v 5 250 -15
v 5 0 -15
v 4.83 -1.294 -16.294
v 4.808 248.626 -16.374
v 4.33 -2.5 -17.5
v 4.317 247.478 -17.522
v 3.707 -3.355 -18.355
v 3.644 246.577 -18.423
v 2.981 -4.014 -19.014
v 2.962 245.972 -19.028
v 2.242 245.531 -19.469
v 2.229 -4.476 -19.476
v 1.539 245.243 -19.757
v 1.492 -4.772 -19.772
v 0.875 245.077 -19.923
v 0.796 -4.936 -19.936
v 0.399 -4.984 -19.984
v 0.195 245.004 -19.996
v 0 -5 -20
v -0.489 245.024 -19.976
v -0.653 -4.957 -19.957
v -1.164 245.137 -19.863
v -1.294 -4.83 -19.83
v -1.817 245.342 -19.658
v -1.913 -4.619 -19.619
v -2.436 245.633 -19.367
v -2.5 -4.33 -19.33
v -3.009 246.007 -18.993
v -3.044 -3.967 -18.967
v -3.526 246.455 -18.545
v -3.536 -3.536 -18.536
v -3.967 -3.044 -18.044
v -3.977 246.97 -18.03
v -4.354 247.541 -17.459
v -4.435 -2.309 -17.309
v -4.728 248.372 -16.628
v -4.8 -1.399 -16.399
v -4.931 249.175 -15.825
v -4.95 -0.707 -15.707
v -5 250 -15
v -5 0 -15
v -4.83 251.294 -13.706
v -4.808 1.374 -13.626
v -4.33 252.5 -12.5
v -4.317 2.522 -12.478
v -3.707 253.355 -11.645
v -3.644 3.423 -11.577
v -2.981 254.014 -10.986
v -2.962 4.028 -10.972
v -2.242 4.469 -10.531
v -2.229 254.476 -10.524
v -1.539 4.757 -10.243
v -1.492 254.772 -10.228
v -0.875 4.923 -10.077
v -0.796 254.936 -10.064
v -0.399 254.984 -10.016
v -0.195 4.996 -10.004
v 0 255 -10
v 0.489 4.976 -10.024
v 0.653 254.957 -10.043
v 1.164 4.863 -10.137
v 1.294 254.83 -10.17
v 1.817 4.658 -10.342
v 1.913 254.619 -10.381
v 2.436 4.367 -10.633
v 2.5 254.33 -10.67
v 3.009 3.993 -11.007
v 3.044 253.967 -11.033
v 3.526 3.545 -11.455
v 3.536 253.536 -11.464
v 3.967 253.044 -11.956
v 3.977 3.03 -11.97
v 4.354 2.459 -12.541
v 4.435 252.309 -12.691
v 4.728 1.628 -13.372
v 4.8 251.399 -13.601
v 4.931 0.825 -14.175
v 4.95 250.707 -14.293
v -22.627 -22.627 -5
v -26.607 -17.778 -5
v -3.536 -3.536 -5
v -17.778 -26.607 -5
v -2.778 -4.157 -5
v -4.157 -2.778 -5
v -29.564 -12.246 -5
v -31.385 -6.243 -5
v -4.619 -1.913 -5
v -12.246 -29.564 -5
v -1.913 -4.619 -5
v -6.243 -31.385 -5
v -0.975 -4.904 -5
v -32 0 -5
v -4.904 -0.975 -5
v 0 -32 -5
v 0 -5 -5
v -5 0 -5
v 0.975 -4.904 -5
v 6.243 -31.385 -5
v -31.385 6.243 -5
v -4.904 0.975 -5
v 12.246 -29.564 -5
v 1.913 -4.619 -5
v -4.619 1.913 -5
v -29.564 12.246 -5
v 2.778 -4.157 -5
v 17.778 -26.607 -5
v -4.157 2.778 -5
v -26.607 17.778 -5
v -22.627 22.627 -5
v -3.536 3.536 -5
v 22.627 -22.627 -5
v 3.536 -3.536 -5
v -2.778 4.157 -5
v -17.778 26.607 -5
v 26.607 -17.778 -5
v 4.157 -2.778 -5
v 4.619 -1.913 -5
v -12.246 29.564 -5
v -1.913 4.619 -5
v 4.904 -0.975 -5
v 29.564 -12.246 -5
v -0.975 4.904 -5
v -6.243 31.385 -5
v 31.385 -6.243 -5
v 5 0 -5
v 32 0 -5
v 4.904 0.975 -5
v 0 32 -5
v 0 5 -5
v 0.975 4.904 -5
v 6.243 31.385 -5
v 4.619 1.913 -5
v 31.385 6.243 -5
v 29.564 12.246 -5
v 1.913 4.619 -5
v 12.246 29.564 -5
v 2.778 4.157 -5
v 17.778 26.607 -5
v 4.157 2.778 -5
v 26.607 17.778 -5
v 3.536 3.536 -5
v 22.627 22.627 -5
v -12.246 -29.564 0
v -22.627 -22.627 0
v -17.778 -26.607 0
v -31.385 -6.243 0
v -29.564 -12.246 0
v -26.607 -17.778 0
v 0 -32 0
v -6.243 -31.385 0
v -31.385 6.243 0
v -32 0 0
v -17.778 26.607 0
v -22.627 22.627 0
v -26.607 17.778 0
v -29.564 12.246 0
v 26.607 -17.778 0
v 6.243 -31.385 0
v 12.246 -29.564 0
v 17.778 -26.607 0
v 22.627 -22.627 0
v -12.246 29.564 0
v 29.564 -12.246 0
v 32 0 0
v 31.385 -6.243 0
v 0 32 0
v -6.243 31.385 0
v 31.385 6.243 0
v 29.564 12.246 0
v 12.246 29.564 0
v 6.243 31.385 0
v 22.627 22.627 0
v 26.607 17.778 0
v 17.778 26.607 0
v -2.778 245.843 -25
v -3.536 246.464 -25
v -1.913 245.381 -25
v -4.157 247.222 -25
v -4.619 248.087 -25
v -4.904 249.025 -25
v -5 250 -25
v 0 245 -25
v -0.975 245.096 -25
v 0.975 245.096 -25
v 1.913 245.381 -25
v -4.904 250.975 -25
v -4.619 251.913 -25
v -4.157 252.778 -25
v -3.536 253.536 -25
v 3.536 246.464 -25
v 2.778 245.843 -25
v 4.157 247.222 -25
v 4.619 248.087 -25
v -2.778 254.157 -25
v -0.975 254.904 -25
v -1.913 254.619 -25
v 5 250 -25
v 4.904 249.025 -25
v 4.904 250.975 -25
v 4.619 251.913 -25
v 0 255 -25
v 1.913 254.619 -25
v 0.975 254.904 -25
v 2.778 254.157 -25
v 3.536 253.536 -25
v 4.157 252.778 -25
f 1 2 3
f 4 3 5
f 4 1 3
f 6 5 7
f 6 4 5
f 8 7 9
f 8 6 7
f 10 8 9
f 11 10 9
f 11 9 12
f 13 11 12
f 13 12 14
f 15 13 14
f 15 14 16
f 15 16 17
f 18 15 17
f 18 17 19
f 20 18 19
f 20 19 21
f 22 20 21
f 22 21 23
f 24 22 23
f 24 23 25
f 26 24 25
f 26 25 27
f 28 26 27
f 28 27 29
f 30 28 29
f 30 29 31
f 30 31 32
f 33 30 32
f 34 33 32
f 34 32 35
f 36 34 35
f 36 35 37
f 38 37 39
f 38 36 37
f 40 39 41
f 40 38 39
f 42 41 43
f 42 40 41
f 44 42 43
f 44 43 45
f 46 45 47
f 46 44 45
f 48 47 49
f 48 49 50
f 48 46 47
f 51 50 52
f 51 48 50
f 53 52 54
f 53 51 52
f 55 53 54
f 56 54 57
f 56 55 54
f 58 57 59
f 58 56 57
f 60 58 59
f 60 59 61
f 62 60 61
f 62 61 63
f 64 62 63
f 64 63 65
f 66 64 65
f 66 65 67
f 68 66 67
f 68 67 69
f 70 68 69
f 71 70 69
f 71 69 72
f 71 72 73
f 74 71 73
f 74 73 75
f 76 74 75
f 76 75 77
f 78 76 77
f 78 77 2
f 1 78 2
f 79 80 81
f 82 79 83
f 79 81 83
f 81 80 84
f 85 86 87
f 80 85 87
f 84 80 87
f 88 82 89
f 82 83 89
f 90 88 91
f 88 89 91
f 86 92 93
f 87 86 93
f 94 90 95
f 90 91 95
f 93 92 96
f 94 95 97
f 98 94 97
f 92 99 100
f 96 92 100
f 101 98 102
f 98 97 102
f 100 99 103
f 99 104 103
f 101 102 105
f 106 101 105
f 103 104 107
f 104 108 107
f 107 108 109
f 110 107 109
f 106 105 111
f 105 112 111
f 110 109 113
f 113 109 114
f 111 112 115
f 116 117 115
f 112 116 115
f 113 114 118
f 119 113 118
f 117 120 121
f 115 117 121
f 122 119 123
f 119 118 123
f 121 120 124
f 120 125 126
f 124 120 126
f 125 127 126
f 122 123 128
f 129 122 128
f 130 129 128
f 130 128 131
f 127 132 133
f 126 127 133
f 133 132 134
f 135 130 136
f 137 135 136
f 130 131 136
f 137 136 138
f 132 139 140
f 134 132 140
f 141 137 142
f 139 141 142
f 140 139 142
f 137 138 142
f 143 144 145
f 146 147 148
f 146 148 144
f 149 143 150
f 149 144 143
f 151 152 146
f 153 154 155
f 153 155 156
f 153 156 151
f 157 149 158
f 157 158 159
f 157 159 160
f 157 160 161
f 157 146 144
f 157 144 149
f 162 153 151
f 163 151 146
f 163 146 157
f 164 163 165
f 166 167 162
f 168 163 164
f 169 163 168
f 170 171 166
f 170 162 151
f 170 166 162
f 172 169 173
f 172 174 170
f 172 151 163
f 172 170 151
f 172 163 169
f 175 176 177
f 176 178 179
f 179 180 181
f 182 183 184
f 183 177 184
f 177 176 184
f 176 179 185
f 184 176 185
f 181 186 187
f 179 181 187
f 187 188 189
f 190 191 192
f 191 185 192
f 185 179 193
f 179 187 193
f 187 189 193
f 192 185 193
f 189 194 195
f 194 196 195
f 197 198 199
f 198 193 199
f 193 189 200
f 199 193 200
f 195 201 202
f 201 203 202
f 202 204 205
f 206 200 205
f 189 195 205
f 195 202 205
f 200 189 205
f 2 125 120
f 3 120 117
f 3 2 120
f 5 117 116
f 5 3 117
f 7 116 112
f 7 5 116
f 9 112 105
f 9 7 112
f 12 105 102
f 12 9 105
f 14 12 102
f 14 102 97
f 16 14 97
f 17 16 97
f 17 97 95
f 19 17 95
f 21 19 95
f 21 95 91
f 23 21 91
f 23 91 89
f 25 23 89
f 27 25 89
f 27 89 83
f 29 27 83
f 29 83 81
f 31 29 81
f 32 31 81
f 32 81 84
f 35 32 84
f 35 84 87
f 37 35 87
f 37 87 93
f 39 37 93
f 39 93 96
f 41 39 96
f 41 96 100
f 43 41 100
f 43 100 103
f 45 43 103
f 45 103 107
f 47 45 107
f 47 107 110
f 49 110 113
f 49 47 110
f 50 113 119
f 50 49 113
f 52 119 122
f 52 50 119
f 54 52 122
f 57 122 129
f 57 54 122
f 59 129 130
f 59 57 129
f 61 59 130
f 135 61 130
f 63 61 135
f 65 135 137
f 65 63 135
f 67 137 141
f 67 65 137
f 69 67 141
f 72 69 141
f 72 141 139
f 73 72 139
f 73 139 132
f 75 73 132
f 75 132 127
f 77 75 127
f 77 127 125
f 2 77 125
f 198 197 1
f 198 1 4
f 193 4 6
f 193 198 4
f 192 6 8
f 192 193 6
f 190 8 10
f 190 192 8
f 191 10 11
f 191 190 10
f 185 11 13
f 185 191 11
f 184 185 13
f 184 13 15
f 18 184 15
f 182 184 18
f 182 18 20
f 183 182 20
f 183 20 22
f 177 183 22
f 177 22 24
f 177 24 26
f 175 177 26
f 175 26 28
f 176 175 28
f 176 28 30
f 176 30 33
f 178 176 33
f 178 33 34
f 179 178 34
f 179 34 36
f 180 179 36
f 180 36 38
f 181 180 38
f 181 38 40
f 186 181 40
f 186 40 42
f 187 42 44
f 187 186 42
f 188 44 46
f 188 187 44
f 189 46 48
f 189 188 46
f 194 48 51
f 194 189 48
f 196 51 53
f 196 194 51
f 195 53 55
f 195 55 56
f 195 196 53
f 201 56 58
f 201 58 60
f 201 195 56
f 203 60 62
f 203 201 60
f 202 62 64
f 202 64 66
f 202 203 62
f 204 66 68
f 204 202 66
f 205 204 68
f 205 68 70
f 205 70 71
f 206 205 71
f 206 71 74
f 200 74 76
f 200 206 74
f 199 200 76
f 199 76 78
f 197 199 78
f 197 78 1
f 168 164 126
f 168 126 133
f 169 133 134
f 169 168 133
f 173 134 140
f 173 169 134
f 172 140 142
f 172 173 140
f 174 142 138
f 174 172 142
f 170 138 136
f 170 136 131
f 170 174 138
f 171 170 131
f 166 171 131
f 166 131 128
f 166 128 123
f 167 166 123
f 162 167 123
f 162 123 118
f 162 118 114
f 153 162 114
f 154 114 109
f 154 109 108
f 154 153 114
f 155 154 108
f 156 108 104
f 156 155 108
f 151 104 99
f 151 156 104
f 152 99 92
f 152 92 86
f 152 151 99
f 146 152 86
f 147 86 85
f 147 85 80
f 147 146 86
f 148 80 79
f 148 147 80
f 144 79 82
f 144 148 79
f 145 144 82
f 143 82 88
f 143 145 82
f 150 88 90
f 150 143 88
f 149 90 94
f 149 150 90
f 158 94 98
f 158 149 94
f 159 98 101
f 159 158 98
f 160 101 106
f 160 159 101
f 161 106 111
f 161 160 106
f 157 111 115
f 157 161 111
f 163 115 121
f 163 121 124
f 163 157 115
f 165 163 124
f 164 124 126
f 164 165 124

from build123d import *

# Parameters (mm, degrees)
SKETCH_1_R      = 32
EXTRUDE_2_DEPTH = 5
SKETCH_5_R      = 5


with BuildPart() as part:
    # 草图1 → 凸台-拉伸2 (new body)
    with BuildSketch(Plane.XY):
        Circle(SKETCH_1_R)
    extrude(amount=-EXTRUDE_2_DEPTH)

    # 扫描1: sweep along a path in 草图2
    with BuildLine(Plane(origin=(0, 0, 0), x_dir=(0, 0, -1), z_dir=(1, 0, 0))) as sweep_1_path:
        Line((5, 0), (15, 0))
        Line((15, 0), (15, 250))
        Line((15, 250), (25, 250))
    # 草图5 → 扫描1 (sweep)
    with BuildSketch(Plane.XY.offset(-5)):
        Circle(SKETCH_5_R)
    sweep(path=sweep_1_path.line, transition=Transition.RIGHT)


solid = part.part
